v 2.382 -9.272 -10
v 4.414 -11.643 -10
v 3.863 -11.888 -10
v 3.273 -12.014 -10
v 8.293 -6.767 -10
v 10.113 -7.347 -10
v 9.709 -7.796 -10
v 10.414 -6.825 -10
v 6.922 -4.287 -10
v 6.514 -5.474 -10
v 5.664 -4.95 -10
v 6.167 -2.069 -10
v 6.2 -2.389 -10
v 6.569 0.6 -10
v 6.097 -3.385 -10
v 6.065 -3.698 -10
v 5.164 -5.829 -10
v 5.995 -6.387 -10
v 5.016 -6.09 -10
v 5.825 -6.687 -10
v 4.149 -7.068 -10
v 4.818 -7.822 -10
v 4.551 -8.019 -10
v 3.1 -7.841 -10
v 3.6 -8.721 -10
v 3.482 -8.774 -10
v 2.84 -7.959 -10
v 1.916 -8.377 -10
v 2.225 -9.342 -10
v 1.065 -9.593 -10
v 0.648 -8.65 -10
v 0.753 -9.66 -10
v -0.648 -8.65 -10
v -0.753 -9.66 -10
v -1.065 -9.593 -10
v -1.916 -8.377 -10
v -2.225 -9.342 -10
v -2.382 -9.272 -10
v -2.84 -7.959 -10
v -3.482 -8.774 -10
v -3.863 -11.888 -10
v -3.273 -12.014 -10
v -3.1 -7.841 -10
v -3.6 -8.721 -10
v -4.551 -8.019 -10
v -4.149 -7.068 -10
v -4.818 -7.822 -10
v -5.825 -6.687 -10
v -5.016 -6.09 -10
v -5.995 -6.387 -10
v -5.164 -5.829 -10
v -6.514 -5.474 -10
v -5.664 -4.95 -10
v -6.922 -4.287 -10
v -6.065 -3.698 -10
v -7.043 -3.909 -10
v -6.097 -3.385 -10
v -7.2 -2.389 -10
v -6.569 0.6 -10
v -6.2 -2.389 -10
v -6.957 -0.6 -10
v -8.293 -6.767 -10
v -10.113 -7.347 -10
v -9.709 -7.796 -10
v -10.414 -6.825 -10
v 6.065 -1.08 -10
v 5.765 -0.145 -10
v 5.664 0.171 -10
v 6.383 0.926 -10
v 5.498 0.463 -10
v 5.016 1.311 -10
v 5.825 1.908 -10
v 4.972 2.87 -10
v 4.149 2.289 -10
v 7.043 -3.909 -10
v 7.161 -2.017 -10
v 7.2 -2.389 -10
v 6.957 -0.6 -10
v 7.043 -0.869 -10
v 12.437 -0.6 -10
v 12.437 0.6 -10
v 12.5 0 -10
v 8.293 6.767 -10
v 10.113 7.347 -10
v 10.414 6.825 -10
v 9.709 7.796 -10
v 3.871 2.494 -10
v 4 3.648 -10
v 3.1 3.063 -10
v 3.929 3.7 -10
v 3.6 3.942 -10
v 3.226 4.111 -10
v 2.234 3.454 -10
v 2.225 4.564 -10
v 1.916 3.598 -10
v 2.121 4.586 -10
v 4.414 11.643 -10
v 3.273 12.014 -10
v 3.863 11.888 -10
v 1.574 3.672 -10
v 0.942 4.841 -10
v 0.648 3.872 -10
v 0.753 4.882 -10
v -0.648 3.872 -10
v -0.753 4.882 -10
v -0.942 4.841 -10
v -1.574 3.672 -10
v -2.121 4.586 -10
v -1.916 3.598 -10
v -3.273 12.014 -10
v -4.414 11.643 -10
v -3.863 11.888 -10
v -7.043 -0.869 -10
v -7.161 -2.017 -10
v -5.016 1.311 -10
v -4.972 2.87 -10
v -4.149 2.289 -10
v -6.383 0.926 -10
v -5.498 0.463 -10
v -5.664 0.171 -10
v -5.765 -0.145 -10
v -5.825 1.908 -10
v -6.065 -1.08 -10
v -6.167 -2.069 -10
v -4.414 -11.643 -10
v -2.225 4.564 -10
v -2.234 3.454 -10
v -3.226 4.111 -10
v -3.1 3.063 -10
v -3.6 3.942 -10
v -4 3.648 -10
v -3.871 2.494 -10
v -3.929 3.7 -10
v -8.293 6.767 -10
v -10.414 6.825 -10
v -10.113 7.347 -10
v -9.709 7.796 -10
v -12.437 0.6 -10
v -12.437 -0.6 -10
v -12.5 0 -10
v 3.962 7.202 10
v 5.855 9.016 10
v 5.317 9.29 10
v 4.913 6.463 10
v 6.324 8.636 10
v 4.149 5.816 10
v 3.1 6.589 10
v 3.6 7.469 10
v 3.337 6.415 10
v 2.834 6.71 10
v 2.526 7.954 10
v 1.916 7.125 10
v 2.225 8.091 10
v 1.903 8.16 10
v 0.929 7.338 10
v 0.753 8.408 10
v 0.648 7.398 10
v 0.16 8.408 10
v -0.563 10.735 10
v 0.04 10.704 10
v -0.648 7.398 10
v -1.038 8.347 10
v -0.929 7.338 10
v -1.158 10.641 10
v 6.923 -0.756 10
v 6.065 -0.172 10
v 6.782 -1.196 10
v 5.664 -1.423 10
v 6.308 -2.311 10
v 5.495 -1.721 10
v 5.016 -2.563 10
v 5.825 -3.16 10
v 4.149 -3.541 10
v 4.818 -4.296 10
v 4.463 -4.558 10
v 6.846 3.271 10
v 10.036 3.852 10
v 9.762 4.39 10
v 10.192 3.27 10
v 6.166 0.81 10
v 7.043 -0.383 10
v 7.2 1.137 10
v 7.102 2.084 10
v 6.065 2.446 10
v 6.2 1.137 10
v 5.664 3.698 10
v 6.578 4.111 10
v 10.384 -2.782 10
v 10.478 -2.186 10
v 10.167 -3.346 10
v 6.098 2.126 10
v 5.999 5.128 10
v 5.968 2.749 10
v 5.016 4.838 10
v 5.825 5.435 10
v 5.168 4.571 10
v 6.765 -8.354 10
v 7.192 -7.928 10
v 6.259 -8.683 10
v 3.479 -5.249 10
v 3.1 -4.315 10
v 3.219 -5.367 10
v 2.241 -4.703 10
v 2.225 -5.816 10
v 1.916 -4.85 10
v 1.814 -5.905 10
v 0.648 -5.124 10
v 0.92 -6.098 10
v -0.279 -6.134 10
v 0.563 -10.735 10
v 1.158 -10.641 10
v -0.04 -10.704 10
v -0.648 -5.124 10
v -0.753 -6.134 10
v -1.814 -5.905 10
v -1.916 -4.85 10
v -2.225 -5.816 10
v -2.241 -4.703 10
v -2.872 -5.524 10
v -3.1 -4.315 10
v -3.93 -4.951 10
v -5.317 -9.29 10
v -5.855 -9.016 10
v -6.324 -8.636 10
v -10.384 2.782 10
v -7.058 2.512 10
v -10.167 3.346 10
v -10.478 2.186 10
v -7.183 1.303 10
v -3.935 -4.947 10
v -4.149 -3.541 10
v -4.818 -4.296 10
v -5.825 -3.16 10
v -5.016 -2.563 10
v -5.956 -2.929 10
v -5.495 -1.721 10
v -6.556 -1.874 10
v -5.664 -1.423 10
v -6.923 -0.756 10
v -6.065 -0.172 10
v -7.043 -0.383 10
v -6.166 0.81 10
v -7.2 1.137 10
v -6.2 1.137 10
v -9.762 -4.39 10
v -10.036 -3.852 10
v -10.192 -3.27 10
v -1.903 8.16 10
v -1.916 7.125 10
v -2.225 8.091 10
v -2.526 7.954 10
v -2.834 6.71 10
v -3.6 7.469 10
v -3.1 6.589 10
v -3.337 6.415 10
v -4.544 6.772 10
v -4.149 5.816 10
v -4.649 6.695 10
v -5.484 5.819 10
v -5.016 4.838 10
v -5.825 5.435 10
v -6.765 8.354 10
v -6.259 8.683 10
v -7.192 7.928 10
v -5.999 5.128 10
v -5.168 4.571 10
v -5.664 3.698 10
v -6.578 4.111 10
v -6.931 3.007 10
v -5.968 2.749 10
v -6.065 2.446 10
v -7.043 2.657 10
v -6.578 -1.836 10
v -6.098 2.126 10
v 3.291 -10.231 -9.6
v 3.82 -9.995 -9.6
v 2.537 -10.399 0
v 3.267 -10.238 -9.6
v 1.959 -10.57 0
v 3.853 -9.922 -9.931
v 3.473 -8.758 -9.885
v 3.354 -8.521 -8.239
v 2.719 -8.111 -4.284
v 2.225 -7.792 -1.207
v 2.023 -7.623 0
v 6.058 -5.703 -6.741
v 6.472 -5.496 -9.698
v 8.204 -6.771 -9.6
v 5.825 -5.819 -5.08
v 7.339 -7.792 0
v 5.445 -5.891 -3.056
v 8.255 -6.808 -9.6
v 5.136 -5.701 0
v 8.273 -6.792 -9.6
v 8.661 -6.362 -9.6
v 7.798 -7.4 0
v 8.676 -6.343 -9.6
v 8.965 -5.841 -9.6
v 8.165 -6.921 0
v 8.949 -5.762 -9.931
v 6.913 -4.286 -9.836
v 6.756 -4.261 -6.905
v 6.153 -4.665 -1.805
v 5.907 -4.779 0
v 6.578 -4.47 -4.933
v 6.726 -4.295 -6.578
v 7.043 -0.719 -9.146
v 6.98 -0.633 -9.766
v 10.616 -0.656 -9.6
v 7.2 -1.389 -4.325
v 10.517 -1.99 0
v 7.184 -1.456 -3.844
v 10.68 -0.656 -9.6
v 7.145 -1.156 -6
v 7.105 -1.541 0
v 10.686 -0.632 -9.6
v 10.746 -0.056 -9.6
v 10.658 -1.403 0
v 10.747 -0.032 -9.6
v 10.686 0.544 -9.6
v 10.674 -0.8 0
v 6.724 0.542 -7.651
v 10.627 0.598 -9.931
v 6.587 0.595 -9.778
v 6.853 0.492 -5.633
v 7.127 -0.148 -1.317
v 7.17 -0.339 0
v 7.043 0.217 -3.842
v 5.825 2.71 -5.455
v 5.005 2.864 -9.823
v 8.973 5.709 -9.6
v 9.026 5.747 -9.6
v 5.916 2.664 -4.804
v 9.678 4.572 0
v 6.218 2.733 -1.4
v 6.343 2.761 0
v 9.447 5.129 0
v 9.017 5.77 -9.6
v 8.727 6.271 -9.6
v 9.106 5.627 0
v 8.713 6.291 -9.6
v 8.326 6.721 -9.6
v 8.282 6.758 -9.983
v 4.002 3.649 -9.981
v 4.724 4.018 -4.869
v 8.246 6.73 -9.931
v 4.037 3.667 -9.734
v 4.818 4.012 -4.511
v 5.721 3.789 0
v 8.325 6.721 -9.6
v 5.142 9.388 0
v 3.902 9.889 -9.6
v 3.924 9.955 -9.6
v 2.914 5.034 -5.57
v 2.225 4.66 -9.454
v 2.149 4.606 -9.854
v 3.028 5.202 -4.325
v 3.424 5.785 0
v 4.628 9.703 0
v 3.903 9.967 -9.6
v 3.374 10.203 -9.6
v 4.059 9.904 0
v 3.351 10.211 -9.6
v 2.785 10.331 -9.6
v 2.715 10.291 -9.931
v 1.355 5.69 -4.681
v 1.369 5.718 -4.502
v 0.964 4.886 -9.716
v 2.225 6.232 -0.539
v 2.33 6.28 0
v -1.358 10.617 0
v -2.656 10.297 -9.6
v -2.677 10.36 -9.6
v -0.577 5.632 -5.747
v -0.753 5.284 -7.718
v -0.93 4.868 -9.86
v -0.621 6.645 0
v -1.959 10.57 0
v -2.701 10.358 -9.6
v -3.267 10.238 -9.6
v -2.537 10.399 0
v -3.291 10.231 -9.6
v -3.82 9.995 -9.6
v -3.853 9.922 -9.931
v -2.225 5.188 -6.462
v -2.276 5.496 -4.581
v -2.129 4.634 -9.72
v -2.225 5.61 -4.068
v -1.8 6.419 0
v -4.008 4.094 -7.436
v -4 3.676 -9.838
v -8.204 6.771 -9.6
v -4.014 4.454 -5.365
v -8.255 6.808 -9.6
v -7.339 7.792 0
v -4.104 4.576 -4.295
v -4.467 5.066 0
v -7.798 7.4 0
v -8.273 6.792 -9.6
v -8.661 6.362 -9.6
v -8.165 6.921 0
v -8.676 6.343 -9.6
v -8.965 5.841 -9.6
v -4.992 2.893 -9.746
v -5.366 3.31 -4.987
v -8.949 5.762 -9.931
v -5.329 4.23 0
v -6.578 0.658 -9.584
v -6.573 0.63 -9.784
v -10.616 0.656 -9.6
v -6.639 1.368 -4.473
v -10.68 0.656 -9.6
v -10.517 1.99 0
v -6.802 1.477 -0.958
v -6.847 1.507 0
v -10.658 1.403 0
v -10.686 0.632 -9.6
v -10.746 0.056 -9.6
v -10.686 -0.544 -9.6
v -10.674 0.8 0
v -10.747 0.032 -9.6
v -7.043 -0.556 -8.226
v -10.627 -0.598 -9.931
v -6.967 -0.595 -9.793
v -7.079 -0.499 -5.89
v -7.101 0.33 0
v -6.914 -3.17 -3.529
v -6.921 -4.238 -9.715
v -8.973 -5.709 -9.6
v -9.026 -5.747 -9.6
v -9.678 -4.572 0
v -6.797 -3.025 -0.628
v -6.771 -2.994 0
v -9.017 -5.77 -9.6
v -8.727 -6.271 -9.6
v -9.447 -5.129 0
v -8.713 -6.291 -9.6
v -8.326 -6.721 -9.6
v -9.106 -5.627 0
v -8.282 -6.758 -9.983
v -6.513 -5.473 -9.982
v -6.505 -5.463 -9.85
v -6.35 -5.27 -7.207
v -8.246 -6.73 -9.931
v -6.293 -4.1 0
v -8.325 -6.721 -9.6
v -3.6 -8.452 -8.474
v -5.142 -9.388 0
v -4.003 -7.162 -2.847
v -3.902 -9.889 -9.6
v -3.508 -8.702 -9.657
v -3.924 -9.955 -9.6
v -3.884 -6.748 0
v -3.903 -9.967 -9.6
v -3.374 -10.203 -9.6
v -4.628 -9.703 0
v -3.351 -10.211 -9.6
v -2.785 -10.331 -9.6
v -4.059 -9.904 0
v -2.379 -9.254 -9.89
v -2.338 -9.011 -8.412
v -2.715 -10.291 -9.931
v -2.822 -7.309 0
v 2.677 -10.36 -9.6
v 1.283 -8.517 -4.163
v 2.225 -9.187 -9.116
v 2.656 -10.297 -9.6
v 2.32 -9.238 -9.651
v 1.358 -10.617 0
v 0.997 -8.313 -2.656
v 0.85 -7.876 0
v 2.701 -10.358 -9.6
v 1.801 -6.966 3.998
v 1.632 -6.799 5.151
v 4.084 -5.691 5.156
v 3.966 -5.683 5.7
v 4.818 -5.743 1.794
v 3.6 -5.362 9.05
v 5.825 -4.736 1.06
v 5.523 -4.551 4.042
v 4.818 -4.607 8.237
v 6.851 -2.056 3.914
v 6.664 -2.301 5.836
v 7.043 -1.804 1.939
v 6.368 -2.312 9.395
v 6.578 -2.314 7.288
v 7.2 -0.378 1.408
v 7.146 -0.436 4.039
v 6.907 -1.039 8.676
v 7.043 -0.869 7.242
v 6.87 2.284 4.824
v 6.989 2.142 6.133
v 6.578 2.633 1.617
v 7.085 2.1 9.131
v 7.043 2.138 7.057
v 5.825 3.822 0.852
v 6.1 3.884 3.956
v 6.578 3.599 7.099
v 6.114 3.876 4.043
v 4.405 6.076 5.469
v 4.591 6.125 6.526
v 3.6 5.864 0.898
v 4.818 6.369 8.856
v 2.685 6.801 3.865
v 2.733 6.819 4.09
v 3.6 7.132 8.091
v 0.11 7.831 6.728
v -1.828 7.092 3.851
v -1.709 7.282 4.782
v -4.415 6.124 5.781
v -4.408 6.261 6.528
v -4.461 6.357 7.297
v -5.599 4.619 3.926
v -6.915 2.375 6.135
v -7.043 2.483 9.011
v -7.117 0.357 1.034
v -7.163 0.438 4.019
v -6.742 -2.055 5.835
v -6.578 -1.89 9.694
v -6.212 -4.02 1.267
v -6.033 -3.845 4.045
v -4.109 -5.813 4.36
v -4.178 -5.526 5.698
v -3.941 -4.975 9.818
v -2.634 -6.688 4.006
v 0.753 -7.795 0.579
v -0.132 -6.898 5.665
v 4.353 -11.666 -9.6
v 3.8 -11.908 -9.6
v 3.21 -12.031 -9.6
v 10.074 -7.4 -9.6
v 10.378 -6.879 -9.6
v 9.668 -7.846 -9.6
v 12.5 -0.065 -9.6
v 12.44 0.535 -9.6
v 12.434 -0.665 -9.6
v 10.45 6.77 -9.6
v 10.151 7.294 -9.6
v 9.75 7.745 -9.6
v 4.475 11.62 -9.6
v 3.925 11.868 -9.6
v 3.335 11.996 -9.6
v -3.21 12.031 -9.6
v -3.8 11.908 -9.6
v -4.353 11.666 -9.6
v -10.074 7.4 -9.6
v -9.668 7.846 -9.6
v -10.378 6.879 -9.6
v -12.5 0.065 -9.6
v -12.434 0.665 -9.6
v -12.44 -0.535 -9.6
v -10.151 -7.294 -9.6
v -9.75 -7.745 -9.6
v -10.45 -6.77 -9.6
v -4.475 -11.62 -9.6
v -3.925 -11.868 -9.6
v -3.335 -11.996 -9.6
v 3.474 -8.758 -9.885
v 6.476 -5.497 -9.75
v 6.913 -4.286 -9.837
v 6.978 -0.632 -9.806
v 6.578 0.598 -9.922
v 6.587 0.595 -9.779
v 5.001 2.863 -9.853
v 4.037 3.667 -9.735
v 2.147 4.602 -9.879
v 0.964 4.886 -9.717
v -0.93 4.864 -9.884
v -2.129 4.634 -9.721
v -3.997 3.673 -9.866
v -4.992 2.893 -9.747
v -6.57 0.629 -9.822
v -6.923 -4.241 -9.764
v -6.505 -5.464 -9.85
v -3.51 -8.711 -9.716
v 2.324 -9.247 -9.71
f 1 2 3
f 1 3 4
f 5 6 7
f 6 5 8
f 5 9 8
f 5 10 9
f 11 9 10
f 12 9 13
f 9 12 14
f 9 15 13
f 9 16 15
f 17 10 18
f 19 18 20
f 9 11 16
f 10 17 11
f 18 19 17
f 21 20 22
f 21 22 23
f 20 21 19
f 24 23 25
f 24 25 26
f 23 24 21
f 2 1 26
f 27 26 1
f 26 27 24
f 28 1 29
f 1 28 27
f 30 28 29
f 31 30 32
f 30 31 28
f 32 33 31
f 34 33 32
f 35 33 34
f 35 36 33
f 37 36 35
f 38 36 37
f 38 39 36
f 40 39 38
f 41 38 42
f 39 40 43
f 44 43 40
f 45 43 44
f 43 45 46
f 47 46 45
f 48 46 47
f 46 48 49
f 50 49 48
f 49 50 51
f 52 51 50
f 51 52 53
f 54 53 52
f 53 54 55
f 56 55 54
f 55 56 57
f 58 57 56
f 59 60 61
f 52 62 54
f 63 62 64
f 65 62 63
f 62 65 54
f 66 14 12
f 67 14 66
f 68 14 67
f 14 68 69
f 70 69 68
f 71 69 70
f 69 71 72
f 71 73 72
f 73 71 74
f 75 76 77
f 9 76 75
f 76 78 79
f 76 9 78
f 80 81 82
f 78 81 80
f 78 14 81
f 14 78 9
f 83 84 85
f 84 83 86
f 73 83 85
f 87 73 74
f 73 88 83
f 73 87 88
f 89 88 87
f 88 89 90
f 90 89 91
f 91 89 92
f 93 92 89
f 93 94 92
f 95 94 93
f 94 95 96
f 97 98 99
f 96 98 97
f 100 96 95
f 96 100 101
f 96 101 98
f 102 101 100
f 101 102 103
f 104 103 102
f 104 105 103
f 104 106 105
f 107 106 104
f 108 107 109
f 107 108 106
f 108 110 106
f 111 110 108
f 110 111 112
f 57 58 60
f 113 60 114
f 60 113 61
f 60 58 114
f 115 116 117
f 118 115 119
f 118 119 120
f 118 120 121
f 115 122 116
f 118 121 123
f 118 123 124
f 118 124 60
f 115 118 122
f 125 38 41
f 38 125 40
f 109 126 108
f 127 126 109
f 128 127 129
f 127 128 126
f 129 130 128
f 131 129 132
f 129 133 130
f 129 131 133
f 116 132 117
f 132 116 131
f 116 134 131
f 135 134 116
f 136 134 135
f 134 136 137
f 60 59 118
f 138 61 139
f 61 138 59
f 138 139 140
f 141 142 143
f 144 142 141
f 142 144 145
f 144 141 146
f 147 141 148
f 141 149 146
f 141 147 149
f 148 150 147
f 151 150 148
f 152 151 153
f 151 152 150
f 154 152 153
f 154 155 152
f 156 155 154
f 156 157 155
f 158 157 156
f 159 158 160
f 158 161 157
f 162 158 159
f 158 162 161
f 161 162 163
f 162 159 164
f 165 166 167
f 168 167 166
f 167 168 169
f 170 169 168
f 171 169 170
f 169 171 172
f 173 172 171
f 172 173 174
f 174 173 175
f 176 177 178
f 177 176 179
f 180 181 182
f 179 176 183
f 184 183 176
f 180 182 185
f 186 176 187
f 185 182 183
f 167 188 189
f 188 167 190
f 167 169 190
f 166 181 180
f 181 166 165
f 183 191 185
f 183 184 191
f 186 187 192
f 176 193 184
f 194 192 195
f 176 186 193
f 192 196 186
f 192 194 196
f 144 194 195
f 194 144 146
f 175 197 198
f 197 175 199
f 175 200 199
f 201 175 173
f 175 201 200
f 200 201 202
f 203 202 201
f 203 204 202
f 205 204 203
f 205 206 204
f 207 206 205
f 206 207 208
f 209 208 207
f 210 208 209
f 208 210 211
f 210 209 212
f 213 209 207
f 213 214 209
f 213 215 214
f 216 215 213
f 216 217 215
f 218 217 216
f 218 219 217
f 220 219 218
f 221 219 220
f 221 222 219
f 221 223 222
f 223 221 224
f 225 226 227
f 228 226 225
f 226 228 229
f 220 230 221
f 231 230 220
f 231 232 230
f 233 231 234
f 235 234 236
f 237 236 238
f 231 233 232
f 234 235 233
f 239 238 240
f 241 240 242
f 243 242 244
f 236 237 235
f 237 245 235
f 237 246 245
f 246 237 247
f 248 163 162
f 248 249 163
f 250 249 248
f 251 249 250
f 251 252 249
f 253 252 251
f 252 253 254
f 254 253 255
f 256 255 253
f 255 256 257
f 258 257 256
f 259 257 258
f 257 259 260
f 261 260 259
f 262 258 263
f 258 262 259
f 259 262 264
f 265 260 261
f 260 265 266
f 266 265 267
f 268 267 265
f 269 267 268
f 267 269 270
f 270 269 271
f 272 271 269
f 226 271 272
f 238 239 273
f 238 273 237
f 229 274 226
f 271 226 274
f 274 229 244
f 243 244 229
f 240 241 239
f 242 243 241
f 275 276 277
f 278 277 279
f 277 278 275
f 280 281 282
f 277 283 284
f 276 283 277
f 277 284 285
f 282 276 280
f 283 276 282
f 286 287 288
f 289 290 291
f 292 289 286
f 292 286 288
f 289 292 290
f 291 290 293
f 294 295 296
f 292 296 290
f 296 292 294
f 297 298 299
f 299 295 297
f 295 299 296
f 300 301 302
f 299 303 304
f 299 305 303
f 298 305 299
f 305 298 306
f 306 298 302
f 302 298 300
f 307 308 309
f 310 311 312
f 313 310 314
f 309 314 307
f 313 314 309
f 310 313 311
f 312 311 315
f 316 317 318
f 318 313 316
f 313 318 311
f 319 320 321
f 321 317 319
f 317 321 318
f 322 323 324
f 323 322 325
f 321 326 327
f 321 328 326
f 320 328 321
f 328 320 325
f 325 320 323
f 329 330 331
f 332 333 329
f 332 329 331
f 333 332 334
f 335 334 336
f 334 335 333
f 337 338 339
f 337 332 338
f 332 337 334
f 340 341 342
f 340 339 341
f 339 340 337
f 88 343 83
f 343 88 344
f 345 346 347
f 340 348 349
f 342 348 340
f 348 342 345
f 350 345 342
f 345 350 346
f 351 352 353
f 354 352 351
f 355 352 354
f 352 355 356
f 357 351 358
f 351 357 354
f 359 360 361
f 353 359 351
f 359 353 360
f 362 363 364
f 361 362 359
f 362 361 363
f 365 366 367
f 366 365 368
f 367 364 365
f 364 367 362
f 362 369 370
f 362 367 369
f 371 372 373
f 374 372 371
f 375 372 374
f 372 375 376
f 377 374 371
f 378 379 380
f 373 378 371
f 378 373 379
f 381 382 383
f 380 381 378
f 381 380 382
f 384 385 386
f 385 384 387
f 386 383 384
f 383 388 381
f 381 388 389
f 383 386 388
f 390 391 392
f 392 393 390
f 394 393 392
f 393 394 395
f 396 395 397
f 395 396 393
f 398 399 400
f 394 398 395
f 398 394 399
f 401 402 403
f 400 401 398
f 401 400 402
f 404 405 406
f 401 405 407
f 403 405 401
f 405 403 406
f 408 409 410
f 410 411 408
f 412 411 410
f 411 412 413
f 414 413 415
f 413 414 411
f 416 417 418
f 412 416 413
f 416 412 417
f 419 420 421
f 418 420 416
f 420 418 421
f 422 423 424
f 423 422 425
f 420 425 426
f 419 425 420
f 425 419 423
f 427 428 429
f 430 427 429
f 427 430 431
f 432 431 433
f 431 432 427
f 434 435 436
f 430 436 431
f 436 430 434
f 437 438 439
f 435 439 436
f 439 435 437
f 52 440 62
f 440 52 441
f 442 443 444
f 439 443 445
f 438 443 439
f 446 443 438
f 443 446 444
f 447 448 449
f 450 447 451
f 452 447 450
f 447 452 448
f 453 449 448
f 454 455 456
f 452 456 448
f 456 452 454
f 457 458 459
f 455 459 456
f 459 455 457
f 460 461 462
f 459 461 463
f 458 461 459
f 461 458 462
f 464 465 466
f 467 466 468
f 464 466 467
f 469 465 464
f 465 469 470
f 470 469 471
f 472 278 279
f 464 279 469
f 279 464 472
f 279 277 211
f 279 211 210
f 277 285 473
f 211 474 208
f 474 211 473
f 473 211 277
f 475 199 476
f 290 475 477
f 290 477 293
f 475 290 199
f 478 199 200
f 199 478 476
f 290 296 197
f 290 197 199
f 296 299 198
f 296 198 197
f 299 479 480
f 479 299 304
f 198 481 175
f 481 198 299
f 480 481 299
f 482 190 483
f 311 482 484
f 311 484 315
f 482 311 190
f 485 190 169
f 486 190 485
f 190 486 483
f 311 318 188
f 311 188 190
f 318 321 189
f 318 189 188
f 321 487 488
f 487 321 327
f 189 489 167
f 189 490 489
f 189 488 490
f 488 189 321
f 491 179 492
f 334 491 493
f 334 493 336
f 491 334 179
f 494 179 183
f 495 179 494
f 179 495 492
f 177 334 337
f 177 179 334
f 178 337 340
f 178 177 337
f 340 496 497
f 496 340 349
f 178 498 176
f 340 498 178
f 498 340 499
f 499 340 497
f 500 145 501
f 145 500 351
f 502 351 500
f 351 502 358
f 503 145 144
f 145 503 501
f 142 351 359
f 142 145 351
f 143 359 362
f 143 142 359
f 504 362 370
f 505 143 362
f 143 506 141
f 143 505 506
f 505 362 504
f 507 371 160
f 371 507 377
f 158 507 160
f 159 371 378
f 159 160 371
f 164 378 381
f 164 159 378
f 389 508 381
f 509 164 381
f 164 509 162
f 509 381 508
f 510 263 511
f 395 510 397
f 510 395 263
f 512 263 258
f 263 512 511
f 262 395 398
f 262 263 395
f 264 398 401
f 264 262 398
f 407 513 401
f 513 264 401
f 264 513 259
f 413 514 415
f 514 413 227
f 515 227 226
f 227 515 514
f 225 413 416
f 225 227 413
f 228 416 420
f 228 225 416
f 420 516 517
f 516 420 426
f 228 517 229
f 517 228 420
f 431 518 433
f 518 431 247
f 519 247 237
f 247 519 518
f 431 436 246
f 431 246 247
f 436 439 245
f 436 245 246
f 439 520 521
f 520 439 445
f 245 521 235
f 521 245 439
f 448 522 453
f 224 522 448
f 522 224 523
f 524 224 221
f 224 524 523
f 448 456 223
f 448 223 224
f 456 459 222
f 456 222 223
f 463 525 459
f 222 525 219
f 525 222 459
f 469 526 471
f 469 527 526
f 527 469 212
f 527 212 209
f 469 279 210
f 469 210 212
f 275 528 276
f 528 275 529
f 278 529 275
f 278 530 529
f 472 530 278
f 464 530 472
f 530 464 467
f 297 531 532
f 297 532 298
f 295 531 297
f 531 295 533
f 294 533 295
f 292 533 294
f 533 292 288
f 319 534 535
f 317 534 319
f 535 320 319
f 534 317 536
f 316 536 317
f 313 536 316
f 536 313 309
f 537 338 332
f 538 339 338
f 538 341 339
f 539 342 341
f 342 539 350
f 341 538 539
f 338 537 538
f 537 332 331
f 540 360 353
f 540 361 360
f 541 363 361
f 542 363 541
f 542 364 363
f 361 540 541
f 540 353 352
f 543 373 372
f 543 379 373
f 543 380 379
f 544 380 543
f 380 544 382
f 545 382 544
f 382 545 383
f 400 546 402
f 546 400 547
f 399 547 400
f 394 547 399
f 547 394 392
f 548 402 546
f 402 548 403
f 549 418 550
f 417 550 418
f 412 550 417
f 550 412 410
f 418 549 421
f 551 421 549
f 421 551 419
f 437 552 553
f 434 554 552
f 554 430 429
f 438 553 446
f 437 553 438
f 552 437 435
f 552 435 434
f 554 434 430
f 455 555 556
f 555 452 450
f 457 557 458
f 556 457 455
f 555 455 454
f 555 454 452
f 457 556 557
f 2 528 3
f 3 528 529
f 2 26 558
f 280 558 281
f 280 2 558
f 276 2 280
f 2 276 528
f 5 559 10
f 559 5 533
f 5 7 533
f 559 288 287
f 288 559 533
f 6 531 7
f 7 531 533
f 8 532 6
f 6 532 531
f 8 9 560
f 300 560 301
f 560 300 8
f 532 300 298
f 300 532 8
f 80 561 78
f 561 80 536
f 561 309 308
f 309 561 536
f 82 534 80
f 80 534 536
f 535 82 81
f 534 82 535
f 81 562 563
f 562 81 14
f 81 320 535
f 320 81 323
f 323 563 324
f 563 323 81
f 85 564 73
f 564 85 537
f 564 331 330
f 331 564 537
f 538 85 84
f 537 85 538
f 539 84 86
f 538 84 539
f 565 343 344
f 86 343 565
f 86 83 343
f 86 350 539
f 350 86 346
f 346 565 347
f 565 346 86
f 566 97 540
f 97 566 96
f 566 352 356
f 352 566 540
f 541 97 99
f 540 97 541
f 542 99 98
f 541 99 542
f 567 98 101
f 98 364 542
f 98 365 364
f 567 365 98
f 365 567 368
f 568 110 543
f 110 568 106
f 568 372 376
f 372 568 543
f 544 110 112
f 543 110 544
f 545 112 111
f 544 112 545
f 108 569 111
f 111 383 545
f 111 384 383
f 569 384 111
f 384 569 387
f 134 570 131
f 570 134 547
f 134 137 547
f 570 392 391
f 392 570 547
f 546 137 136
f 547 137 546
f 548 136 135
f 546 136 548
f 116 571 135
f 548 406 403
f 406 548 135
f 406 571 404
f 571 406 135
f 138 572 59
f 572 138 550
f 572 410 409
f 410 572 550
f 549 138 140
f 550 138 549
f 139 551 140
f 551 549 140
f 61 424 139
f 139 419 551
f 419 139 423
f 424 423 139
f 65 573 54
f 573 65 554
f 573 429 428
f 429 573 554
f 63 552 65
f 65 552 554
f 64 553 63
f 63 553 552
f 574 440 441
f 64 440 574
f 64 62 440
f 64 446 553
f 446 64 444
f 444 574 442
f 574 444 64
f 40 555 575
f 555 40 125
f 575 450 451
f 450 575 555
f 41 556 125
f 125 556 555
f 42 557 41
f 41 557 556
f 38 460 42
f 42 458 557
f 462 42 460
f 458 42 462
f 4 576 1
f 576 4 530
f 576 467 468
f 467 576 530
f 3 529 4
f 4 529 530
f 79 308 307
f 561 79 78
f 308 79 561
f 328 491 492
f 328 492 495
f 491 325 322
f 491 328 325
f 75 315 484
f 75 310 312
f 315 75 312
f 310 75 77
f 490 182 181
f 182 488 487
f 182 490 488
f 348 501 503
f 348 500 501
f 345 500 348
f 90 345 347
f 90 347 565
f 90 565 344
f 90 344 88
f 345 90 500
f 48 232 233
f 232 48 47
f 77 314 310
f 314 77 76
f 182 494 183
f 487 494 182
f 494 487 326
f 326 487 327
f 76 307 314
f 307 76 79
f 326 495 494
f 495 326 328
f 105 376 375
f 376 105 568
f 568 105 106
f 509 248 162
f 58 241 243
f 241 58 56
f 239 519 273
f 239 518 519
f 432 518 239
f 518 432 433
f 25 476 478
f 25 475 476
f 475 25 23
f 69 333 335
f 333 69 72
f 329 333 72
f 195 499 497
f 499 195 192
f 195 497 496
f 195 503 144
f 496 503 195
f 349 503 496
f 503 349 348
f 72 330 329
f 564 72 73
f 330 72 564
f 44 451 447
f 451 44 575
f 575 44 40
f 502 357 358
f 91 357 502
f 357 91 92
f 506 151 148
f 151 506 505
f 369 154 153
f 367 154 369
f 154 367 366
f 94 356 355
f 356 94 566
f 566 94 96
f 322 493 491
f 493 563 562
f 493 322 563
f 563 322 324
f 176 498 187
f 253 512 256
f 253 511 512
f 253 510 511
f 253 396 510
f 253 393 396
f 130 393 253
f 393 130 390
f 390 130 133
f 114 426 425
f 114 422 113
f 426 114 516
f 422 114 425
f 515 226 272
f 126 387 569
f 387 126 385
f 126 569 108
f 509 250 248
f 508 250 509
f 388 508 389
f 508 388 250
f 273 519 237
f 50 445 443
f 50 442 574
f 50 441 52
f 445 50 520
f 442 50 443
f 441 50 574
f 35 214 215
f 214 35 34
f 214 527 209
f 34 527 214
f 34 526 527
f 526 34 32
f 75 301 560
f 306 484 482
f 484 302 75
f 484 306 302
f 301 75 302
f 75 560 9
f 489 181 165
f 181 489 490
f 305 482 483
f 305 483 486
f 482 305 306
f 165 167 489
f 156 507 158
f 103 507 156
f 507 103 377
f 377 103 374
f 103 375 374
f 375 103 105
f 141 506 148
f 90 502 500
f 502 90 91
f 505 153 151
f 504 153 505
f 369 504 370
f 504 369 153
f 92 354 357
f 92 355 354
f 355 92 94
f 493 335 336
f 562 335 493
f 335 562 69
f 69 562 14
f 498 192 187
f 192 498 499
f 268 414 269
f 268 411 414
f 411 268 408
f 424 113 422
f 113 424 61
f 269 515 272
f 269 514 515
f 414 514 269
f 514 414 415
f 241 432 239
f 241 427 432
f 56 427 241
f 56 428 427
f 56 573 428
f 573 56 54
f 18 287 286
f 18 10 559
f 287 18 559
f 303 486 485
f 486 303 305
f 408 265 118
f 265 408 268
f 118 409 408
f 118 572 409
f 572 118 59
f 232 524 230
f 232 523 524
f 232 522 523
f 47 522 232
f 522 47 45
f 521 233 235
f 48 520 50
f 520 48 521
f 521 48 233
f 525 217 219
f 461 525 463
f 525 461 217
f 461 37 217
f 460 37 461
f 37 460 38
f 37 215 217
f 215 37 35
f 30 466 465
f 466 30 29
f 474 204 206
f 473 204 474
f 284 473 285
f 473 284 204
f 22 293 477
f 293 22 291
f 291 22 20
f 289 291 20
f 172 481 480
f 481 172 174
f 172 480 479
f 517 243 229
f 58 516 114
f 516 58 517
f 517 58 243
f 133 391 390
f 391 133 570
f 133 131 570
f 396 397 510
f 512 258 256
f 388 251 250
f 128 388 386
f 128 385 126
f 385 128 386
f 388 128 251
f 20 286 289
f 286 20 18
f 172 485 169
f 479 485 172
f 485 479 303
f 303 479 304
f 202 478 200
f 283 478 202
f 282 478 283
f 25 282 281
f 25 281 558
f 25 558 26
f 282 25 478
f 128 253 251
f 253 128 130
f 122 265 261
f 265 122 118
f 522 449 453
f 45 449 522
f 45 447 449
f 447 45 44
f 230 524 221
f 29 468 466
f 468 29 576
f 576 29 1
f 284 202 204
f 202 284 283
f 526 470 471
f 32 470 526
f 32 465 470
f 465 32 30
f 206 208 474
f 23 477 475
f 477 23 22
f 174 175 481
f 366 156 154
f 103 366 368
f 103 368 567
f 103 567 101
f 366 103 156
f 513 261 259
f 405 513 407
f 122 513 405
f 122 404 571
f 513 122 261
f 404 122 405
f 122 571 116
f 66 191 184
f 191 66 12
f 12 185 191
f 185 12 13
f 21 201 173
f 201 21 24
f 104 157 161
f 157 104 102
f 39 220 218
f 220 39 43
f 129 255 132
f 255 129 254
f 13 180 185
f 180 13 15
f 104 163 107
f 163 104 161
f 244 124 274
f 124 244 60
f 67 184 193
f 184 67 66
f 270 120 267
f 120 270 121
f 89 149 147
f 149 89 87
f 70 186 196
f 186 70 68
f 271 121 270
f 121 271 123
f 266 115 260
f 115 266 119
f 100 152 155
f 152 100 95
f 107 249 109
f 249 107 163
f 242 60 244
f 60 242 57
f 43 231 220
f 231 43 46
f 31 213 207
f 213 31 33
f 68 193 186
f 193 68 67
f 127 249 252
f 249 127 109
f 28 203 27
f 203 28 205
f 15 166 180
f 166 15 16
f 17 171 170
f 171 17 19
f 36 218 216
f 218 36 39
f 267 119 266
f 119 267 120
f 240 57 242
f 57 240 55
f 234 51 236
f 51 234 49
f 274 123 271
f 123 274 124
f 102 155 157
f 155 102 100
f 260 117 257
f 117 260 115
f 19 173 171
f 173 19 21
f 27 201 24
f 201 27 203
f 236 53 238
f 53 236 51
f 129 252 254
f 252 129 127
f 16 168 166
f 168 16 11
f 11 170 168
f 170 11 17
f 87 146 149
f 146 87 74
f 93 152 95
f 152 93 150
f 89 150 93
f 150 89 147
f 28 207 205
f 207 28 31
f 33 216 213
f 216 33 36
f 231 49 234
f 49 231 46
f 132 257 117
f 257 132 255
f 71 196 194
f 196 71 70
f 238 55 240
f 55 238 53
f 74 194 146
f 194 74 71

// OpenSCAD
// For the never-ending floating bottle illusion
// Adrian McCarthy 2023-06-26
//
// Based on a Make & Take by Eric Van Huystee (URL HERE!!!)
//
// Patterned after a project by Wicked Makers https://youtu.be/3IJSDtKw0KM
//
// Another version of the adapter, for a slightly different bottle, was
// designed by Vince Parsons.
//
// The idea is to attach the rigid, clear input tube to the inside of the
// neck of the bottle while allowing the liquid to flow back out all the
// way around the tube.  The original design used a bit of flexible tubing
// attached to the inside of the neck, but that didn't reliably let the
// output fluid flow to the "underside" of the bent tube, spoiling the
// illusion.

module bottle_adapter() {
    bottle_od = 25;
    bottle_id = 21.5;
    tube_od = 12;
    tube_id = 8;
    spokes = 10;
    spoke_th = 1.2;
    ring_th = min(1.2, (tube_od - tube_id) / 2);
    ring_od = tube_od + 2*ring_th;
    adapter_l = 20;
    nozzle_d = 0.4;
    twist = 15;
    tilt = 10;
    bias = min(2, (bottle_id-ring_od)/2 * sin(tilt));

    $fs=nozzle_d/2;
    
    module spokes(od) {
        intersection() {
            circle(d=od);

            dtheta = 360 / spokes;
            for (theta = [dtheta:dtheta:360]) {
                rotate([0, 0, theta])
                    translate([0, -spoke_th/2])
                        square([od, spoke_th]);
            }
        }
    }
    
    module core() {
        translate([0, -bias, 0]) circle(d=ring_od);
    }
    
    difference() {
        intersection() {
            union() {
                translate([0, 0, -adapter_l/2]) {
                    linear_extrude(adapter_l, convexity=10, twist=twist) {
                        spokes(bottle_id);
                    }
                    linear_extrude(nozzle_d, convexity=10, twist=twist*nozzle_d/adapter_l) {
                        spokes(bottle_od);
                    }
                }
                rotate([-tilt, 0, 0]) {
                    linear_extrude(2*adapter_l, convexity=4,center=true) {
                        core();
                    }
                }
            }
            cube([2*bottle_od, 2*bottle_od, adapter_l], center=true);
        }
        rotate([-tilt, 0, 0]) translate([0, -bias, 0])
            cylinder(d=tube_od + nozzle_d, h=2*adapter_l, center=true);
    }

    tube_ir = tube_id/2;
    input_area = PI * tube_ir*tube_ir;

    bottle_ir = bottle_id/2;
    bottle_area = PI * bottle_ir*bottle_ir;
    ring_or = ring_od/2;
    ring_area = PI * ring_or*ring_or;
    spoke_area = (bottle_ir - ring_or) * spoke_th; // approximate
    spokes_area = spokes * spoke_area;
    output_area = bottle_area - ring_area - spokes_area;

    echo(str("Cross sectional area of input tube:   ", input_area, " mm^2"));
    echo(str("Total cross sectional area of output: ", output_area, " mm^2"));
    assert(output_area >= input_area);
}

bottle_adapter();
